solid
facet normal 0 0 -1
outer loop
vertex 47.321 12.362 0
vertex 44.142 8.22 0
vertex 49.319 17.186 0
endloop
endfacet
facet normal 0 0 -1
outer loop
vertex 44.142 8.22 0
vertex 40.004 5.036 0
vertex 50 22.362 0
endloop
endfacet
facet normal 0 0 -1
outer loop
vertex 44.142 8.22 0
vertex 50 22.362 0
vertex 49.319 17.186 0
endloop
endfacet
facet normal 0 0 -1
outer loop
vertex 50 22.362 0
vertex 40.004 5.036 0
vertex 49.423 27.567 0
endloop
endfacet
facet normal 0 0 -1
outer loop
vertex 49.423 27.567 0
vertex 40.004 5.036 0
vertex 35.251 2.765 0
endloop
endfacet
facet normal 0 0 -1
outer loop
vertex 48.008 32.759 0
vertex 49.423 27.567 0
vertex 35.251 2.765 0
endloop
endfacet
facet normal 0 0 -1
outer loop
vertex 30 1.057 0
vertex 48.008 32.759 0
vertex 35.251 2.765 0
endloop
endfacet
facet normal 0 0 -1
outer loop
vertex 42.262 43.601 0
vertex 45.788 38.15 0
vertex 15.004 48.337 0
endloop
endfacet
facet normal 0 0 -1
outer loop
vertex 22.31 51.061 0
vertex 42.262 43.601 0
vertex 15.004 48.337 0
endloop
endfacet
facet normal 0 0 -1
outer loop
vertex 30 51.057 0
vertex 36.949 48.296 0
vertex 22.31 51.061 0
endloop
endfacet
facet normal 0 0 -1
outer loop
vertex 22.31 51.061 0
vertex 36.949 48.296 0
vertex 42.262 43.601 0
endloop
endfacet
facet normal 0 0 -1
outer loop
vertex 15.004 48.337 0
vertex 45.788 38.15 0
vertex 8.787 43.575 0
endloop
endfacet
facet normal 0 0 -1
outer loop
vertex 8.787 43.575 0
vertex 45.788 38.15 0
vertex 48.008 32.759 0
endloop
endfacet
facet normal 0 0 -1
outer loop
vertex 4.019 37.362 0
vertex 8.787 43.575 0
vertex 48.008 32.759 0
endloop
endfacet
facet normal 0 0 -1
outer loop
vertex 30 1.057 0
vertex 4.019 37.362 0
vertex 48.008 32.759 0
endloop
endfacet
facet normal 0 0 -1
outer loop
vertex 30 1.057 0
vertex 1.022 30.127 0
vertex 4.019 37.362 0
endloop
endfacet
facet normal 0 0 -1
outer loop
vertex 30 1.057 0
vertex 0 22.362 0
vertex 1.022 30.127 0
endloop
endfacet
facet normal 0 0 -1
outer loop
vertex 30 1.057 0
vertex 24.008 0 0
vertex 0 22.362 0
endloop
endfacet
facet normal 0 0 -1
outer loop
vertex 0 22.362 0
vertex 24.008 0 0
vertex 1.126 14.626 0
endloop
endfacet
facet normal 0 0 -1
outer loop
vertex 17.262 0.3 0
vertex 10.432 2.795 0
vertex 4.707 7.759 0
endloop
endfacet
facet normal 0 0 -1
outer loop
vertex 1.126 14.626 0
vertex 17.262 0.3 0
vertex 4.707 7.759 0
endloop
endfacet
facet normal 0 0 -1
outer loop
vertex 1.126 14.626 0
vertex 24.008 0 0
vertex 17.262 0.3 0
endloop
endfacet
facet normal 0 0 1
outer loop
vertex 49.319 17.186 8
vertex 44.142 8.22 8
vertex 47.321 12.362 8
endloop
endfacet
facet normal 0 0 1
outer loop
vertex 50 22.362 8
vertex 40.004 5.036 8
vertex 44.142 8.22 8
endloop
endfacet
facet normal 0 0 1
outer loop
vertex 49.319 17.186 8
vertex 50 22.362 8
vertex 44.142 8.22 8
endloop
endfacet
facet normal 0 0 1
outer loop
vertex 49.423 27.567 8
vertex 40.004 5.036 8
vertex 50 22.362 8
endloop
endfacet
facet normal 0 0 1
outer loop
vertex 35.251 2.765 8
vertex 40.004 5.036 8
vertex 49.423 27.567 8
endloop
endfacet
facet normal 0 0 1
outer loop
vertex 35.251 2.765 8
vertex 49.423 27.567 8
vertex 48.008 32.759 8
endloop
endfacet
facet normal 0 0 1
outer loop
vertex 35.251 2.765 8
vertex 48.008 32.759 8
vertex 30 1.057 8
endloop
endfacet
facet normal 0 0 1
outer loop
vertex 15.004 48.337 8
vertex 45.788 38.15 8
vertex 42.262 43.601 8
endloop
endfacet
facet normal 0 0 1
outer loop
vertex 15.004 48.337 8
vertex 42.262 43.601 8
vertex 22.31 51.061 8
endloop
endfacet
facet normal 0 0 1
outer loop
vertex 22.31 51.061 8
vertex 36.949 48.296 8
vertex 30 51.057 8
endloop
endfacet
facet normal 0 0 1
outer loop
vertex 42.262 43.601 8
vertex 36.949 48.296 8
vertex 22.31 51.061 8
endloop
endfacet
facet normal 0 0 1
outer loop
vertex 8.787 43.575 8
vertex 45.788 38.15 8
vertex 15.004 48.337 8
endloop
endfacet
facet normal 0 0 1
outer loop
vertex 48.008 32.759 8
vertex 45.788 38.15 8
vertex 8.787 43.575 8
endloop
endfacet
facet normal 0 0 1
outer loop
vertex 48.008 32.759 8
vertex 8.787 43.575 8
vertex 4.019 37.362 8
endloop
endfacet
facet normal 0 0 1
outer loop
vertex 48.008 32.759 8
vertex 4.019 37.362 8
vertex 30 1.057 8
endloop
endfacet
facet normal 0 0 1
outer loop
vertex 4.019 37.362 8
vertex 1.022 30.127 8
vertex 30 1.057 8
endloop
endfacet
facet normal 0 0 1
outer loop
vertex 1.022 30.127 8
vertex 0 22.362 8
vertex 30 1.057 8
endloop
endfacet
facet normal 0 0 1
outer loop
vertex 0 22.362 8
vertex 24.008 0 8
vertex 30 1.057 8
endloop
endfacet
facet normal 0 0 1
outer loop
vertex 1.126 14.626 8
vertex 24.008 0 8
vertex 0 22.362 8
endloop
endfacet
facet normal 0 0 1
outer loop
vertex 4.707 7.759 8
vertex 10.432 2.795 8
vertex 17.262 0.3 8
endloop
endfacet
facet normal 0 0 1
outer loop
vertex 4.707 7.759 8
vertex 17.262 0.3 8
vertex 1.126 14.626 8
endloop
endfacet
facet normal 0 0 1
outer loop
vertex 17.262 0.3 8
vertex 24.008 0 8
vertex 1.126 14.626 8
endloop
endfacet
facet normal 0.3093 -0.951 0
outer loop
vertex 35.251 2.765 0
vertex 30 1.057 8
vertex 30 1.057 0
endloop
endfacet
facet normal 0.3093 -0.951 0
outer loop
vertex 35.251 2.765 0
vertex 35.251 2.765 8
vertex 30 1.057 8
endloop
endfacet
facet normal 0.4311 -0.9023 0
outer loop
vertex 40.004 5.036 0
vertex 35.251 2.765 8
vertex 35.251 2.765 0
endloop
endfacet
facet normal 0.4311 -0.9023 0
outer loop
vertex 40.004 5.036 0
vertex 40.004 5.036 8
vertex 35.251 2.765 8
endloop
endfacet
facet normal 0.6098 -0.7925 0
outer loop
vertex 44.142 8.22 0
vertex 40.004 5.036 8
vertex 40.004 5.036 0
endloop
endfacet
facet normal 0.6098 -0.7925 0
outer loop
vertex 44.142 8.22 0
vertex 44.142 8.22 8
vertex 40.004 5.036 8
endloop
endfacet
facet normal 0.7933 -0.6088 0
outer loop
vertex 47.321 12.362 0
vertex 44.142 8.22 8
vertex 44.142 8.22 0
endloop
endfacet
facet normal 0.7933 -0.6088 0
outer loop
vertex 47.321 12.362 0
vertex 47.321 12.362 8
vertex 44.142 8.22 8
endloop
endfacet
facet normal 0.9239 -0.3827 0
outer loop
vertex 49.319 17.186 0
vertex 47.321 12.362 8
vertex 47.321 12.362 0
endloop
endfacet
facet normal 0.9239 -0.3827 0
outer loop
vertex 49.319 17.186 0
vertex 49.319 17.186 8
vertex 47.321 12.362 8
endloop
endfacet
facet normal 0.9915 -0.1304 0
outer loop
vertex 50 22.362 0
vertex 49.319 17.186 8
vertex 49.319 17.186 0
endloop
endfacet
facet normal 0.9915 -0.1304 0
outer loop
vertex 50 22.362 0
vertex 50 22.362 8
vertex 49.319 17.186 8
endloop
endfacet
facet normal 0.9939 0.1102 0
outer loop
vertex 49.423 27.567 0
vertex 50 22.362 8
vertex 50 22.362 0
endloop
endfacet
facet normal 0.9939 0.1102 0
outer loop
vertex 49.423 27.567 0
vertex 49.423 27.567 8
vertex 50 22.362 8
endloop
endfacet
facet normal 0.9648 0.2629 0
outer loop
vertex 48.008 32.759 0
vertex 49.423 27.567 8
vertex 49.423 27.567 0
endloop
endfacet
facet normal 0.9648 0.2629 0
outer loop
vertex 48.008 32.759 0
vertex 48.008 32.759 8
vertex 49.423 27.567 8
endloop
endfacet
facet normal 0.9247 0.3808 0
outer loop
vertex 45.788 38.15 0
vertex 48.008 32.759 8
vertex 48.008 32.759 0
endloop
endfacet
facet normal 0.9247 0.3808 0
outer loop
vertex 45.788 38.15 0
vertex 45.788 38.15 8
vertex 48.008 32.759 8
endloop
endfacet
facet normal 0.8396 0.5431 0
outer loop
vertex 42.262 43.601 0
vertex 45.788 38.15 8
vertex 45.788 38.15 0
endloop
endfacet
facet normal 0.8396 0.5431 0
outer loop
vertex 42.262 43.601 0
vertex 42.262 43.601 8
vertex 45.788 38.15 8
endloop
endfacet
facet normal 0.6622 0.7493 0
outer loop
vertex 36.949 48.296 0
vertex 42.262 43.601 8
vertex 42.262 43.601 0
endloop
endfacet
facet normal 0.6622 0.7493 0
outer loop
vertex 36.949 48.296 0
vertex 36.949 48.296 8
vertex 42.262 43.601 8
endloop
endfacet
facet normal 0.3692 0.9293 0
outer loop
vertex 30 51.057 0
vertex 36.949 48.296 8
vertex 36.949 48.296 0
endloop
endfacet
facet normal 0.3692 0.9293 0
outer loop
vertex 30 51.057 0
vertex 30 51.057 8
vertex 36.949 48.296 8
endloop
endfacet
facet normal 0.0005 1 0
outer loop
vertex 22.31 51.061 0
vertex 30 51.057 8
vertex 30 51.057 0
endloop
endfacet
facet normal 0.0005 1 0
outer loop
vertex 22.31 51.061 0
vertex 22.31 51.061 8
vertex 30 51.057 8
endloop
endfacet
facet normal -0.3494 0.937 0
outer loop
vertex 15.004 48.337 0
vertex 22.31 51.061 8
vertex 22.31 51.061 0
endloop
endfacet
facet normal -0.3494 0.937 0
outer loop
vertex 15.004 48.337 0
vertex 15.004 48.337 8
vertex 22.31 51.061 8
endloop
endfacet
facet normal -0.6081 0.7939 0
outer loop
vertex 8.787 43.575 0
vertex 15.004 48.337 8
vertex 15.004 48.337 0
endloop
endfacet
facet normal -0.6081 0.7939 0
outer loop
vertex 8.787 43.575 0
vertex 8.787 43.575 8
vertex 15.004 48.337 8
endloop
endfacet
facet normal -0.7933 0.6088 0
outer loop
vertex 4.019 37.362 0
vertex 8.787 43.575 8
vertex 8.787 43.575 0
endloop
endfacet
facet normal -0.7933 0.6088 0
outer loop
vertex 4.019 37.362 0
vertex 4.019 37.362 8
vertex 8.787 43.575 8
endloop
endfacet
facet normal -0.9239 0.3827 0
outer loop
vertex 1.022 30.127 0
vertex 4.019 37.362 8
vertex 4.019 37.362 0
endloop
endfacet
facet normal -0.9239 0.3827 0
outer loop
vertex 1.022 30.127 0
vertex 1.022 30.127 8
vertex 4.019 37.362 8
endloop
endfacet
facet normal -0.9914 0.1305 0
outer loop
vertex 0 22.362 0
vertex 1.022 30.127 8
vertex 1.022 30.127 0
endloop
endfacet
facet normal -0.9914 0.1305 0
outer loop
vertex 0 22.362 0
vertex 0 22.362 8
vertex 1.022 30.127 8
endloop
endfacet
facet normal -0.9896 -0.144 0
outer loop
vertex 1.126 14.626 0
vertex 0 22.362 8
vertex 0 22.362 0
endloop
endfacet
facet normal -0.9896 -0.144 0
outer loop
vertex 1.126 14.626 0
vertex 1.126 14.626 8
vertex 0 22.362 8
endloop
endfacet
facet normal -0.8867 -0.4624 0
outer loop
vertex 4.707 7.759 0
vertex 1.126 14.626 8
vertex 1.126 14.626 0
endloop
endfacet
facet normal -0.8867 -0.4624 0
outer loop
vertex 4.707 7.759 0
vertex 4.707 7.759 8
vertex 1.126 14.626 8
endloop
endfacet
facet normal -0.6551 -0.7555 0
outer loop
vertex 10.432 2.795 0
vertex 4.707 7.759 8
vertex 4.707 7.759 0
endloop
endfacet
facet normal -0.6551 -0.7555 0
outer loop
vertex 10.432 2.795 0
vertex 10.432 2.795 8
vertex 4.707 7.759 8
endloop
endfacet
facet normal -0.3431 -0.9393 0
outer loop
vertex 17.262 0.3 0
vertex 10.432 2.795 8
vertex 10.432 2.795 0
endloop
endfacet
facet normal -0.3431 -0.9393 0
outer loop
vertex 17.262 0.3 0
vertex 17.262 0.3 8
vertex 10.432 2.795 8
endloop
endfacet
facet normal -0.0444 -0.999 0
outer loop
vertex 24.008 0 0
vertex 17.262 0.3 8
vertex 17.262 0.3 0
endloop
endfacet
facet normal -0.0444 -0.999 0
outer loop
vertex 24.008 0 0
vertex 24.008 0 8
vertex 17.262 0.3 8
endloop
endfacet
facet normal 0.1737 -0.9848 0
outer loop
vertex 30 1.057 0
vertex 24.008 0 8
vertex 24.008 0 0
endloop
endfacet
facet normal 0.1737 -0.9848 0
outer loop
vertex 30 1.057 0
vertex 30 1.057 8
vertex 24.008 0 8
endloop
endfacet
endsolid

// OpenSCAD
$fn = 32;

// ----------------------------------------------------------------------
// Cam disc: base radius 20.0 mm, lift 10.0 mm, 24 profile points
// ----------------------------------------------------------------------

// --- parameters (mm) ---
profile_height = 8;       // extrusion height
profile_points = 24;      // points of the closed outline

profile = [[50, 22.362], [49.423, 27.567], [48.008, 32.759], [45.788, 38.15], [42.262, 43.601], [36.949, 48.296], [30, 51.057], [22.31, 51.061], [15.004, 48.337], [8.787, 43.575], [4.019, 37.362], [1.022, 30.127], [0, 22.362], [1.126, 14.626], [4.707, 7.759], [10.432, 2.795], [17.262, 0.3], [24.008, 0], [30, 1.057], [35.251, 2.765], [40.004, 5.036], [44.142, 8.22], [47.321, 12.362], [49.319, 17.186]];  // single closed polygon, 24 points, counter clockwise

// --- the one profile operation ---
linear_extrude(height = profile_height) polygon(points = profile);
